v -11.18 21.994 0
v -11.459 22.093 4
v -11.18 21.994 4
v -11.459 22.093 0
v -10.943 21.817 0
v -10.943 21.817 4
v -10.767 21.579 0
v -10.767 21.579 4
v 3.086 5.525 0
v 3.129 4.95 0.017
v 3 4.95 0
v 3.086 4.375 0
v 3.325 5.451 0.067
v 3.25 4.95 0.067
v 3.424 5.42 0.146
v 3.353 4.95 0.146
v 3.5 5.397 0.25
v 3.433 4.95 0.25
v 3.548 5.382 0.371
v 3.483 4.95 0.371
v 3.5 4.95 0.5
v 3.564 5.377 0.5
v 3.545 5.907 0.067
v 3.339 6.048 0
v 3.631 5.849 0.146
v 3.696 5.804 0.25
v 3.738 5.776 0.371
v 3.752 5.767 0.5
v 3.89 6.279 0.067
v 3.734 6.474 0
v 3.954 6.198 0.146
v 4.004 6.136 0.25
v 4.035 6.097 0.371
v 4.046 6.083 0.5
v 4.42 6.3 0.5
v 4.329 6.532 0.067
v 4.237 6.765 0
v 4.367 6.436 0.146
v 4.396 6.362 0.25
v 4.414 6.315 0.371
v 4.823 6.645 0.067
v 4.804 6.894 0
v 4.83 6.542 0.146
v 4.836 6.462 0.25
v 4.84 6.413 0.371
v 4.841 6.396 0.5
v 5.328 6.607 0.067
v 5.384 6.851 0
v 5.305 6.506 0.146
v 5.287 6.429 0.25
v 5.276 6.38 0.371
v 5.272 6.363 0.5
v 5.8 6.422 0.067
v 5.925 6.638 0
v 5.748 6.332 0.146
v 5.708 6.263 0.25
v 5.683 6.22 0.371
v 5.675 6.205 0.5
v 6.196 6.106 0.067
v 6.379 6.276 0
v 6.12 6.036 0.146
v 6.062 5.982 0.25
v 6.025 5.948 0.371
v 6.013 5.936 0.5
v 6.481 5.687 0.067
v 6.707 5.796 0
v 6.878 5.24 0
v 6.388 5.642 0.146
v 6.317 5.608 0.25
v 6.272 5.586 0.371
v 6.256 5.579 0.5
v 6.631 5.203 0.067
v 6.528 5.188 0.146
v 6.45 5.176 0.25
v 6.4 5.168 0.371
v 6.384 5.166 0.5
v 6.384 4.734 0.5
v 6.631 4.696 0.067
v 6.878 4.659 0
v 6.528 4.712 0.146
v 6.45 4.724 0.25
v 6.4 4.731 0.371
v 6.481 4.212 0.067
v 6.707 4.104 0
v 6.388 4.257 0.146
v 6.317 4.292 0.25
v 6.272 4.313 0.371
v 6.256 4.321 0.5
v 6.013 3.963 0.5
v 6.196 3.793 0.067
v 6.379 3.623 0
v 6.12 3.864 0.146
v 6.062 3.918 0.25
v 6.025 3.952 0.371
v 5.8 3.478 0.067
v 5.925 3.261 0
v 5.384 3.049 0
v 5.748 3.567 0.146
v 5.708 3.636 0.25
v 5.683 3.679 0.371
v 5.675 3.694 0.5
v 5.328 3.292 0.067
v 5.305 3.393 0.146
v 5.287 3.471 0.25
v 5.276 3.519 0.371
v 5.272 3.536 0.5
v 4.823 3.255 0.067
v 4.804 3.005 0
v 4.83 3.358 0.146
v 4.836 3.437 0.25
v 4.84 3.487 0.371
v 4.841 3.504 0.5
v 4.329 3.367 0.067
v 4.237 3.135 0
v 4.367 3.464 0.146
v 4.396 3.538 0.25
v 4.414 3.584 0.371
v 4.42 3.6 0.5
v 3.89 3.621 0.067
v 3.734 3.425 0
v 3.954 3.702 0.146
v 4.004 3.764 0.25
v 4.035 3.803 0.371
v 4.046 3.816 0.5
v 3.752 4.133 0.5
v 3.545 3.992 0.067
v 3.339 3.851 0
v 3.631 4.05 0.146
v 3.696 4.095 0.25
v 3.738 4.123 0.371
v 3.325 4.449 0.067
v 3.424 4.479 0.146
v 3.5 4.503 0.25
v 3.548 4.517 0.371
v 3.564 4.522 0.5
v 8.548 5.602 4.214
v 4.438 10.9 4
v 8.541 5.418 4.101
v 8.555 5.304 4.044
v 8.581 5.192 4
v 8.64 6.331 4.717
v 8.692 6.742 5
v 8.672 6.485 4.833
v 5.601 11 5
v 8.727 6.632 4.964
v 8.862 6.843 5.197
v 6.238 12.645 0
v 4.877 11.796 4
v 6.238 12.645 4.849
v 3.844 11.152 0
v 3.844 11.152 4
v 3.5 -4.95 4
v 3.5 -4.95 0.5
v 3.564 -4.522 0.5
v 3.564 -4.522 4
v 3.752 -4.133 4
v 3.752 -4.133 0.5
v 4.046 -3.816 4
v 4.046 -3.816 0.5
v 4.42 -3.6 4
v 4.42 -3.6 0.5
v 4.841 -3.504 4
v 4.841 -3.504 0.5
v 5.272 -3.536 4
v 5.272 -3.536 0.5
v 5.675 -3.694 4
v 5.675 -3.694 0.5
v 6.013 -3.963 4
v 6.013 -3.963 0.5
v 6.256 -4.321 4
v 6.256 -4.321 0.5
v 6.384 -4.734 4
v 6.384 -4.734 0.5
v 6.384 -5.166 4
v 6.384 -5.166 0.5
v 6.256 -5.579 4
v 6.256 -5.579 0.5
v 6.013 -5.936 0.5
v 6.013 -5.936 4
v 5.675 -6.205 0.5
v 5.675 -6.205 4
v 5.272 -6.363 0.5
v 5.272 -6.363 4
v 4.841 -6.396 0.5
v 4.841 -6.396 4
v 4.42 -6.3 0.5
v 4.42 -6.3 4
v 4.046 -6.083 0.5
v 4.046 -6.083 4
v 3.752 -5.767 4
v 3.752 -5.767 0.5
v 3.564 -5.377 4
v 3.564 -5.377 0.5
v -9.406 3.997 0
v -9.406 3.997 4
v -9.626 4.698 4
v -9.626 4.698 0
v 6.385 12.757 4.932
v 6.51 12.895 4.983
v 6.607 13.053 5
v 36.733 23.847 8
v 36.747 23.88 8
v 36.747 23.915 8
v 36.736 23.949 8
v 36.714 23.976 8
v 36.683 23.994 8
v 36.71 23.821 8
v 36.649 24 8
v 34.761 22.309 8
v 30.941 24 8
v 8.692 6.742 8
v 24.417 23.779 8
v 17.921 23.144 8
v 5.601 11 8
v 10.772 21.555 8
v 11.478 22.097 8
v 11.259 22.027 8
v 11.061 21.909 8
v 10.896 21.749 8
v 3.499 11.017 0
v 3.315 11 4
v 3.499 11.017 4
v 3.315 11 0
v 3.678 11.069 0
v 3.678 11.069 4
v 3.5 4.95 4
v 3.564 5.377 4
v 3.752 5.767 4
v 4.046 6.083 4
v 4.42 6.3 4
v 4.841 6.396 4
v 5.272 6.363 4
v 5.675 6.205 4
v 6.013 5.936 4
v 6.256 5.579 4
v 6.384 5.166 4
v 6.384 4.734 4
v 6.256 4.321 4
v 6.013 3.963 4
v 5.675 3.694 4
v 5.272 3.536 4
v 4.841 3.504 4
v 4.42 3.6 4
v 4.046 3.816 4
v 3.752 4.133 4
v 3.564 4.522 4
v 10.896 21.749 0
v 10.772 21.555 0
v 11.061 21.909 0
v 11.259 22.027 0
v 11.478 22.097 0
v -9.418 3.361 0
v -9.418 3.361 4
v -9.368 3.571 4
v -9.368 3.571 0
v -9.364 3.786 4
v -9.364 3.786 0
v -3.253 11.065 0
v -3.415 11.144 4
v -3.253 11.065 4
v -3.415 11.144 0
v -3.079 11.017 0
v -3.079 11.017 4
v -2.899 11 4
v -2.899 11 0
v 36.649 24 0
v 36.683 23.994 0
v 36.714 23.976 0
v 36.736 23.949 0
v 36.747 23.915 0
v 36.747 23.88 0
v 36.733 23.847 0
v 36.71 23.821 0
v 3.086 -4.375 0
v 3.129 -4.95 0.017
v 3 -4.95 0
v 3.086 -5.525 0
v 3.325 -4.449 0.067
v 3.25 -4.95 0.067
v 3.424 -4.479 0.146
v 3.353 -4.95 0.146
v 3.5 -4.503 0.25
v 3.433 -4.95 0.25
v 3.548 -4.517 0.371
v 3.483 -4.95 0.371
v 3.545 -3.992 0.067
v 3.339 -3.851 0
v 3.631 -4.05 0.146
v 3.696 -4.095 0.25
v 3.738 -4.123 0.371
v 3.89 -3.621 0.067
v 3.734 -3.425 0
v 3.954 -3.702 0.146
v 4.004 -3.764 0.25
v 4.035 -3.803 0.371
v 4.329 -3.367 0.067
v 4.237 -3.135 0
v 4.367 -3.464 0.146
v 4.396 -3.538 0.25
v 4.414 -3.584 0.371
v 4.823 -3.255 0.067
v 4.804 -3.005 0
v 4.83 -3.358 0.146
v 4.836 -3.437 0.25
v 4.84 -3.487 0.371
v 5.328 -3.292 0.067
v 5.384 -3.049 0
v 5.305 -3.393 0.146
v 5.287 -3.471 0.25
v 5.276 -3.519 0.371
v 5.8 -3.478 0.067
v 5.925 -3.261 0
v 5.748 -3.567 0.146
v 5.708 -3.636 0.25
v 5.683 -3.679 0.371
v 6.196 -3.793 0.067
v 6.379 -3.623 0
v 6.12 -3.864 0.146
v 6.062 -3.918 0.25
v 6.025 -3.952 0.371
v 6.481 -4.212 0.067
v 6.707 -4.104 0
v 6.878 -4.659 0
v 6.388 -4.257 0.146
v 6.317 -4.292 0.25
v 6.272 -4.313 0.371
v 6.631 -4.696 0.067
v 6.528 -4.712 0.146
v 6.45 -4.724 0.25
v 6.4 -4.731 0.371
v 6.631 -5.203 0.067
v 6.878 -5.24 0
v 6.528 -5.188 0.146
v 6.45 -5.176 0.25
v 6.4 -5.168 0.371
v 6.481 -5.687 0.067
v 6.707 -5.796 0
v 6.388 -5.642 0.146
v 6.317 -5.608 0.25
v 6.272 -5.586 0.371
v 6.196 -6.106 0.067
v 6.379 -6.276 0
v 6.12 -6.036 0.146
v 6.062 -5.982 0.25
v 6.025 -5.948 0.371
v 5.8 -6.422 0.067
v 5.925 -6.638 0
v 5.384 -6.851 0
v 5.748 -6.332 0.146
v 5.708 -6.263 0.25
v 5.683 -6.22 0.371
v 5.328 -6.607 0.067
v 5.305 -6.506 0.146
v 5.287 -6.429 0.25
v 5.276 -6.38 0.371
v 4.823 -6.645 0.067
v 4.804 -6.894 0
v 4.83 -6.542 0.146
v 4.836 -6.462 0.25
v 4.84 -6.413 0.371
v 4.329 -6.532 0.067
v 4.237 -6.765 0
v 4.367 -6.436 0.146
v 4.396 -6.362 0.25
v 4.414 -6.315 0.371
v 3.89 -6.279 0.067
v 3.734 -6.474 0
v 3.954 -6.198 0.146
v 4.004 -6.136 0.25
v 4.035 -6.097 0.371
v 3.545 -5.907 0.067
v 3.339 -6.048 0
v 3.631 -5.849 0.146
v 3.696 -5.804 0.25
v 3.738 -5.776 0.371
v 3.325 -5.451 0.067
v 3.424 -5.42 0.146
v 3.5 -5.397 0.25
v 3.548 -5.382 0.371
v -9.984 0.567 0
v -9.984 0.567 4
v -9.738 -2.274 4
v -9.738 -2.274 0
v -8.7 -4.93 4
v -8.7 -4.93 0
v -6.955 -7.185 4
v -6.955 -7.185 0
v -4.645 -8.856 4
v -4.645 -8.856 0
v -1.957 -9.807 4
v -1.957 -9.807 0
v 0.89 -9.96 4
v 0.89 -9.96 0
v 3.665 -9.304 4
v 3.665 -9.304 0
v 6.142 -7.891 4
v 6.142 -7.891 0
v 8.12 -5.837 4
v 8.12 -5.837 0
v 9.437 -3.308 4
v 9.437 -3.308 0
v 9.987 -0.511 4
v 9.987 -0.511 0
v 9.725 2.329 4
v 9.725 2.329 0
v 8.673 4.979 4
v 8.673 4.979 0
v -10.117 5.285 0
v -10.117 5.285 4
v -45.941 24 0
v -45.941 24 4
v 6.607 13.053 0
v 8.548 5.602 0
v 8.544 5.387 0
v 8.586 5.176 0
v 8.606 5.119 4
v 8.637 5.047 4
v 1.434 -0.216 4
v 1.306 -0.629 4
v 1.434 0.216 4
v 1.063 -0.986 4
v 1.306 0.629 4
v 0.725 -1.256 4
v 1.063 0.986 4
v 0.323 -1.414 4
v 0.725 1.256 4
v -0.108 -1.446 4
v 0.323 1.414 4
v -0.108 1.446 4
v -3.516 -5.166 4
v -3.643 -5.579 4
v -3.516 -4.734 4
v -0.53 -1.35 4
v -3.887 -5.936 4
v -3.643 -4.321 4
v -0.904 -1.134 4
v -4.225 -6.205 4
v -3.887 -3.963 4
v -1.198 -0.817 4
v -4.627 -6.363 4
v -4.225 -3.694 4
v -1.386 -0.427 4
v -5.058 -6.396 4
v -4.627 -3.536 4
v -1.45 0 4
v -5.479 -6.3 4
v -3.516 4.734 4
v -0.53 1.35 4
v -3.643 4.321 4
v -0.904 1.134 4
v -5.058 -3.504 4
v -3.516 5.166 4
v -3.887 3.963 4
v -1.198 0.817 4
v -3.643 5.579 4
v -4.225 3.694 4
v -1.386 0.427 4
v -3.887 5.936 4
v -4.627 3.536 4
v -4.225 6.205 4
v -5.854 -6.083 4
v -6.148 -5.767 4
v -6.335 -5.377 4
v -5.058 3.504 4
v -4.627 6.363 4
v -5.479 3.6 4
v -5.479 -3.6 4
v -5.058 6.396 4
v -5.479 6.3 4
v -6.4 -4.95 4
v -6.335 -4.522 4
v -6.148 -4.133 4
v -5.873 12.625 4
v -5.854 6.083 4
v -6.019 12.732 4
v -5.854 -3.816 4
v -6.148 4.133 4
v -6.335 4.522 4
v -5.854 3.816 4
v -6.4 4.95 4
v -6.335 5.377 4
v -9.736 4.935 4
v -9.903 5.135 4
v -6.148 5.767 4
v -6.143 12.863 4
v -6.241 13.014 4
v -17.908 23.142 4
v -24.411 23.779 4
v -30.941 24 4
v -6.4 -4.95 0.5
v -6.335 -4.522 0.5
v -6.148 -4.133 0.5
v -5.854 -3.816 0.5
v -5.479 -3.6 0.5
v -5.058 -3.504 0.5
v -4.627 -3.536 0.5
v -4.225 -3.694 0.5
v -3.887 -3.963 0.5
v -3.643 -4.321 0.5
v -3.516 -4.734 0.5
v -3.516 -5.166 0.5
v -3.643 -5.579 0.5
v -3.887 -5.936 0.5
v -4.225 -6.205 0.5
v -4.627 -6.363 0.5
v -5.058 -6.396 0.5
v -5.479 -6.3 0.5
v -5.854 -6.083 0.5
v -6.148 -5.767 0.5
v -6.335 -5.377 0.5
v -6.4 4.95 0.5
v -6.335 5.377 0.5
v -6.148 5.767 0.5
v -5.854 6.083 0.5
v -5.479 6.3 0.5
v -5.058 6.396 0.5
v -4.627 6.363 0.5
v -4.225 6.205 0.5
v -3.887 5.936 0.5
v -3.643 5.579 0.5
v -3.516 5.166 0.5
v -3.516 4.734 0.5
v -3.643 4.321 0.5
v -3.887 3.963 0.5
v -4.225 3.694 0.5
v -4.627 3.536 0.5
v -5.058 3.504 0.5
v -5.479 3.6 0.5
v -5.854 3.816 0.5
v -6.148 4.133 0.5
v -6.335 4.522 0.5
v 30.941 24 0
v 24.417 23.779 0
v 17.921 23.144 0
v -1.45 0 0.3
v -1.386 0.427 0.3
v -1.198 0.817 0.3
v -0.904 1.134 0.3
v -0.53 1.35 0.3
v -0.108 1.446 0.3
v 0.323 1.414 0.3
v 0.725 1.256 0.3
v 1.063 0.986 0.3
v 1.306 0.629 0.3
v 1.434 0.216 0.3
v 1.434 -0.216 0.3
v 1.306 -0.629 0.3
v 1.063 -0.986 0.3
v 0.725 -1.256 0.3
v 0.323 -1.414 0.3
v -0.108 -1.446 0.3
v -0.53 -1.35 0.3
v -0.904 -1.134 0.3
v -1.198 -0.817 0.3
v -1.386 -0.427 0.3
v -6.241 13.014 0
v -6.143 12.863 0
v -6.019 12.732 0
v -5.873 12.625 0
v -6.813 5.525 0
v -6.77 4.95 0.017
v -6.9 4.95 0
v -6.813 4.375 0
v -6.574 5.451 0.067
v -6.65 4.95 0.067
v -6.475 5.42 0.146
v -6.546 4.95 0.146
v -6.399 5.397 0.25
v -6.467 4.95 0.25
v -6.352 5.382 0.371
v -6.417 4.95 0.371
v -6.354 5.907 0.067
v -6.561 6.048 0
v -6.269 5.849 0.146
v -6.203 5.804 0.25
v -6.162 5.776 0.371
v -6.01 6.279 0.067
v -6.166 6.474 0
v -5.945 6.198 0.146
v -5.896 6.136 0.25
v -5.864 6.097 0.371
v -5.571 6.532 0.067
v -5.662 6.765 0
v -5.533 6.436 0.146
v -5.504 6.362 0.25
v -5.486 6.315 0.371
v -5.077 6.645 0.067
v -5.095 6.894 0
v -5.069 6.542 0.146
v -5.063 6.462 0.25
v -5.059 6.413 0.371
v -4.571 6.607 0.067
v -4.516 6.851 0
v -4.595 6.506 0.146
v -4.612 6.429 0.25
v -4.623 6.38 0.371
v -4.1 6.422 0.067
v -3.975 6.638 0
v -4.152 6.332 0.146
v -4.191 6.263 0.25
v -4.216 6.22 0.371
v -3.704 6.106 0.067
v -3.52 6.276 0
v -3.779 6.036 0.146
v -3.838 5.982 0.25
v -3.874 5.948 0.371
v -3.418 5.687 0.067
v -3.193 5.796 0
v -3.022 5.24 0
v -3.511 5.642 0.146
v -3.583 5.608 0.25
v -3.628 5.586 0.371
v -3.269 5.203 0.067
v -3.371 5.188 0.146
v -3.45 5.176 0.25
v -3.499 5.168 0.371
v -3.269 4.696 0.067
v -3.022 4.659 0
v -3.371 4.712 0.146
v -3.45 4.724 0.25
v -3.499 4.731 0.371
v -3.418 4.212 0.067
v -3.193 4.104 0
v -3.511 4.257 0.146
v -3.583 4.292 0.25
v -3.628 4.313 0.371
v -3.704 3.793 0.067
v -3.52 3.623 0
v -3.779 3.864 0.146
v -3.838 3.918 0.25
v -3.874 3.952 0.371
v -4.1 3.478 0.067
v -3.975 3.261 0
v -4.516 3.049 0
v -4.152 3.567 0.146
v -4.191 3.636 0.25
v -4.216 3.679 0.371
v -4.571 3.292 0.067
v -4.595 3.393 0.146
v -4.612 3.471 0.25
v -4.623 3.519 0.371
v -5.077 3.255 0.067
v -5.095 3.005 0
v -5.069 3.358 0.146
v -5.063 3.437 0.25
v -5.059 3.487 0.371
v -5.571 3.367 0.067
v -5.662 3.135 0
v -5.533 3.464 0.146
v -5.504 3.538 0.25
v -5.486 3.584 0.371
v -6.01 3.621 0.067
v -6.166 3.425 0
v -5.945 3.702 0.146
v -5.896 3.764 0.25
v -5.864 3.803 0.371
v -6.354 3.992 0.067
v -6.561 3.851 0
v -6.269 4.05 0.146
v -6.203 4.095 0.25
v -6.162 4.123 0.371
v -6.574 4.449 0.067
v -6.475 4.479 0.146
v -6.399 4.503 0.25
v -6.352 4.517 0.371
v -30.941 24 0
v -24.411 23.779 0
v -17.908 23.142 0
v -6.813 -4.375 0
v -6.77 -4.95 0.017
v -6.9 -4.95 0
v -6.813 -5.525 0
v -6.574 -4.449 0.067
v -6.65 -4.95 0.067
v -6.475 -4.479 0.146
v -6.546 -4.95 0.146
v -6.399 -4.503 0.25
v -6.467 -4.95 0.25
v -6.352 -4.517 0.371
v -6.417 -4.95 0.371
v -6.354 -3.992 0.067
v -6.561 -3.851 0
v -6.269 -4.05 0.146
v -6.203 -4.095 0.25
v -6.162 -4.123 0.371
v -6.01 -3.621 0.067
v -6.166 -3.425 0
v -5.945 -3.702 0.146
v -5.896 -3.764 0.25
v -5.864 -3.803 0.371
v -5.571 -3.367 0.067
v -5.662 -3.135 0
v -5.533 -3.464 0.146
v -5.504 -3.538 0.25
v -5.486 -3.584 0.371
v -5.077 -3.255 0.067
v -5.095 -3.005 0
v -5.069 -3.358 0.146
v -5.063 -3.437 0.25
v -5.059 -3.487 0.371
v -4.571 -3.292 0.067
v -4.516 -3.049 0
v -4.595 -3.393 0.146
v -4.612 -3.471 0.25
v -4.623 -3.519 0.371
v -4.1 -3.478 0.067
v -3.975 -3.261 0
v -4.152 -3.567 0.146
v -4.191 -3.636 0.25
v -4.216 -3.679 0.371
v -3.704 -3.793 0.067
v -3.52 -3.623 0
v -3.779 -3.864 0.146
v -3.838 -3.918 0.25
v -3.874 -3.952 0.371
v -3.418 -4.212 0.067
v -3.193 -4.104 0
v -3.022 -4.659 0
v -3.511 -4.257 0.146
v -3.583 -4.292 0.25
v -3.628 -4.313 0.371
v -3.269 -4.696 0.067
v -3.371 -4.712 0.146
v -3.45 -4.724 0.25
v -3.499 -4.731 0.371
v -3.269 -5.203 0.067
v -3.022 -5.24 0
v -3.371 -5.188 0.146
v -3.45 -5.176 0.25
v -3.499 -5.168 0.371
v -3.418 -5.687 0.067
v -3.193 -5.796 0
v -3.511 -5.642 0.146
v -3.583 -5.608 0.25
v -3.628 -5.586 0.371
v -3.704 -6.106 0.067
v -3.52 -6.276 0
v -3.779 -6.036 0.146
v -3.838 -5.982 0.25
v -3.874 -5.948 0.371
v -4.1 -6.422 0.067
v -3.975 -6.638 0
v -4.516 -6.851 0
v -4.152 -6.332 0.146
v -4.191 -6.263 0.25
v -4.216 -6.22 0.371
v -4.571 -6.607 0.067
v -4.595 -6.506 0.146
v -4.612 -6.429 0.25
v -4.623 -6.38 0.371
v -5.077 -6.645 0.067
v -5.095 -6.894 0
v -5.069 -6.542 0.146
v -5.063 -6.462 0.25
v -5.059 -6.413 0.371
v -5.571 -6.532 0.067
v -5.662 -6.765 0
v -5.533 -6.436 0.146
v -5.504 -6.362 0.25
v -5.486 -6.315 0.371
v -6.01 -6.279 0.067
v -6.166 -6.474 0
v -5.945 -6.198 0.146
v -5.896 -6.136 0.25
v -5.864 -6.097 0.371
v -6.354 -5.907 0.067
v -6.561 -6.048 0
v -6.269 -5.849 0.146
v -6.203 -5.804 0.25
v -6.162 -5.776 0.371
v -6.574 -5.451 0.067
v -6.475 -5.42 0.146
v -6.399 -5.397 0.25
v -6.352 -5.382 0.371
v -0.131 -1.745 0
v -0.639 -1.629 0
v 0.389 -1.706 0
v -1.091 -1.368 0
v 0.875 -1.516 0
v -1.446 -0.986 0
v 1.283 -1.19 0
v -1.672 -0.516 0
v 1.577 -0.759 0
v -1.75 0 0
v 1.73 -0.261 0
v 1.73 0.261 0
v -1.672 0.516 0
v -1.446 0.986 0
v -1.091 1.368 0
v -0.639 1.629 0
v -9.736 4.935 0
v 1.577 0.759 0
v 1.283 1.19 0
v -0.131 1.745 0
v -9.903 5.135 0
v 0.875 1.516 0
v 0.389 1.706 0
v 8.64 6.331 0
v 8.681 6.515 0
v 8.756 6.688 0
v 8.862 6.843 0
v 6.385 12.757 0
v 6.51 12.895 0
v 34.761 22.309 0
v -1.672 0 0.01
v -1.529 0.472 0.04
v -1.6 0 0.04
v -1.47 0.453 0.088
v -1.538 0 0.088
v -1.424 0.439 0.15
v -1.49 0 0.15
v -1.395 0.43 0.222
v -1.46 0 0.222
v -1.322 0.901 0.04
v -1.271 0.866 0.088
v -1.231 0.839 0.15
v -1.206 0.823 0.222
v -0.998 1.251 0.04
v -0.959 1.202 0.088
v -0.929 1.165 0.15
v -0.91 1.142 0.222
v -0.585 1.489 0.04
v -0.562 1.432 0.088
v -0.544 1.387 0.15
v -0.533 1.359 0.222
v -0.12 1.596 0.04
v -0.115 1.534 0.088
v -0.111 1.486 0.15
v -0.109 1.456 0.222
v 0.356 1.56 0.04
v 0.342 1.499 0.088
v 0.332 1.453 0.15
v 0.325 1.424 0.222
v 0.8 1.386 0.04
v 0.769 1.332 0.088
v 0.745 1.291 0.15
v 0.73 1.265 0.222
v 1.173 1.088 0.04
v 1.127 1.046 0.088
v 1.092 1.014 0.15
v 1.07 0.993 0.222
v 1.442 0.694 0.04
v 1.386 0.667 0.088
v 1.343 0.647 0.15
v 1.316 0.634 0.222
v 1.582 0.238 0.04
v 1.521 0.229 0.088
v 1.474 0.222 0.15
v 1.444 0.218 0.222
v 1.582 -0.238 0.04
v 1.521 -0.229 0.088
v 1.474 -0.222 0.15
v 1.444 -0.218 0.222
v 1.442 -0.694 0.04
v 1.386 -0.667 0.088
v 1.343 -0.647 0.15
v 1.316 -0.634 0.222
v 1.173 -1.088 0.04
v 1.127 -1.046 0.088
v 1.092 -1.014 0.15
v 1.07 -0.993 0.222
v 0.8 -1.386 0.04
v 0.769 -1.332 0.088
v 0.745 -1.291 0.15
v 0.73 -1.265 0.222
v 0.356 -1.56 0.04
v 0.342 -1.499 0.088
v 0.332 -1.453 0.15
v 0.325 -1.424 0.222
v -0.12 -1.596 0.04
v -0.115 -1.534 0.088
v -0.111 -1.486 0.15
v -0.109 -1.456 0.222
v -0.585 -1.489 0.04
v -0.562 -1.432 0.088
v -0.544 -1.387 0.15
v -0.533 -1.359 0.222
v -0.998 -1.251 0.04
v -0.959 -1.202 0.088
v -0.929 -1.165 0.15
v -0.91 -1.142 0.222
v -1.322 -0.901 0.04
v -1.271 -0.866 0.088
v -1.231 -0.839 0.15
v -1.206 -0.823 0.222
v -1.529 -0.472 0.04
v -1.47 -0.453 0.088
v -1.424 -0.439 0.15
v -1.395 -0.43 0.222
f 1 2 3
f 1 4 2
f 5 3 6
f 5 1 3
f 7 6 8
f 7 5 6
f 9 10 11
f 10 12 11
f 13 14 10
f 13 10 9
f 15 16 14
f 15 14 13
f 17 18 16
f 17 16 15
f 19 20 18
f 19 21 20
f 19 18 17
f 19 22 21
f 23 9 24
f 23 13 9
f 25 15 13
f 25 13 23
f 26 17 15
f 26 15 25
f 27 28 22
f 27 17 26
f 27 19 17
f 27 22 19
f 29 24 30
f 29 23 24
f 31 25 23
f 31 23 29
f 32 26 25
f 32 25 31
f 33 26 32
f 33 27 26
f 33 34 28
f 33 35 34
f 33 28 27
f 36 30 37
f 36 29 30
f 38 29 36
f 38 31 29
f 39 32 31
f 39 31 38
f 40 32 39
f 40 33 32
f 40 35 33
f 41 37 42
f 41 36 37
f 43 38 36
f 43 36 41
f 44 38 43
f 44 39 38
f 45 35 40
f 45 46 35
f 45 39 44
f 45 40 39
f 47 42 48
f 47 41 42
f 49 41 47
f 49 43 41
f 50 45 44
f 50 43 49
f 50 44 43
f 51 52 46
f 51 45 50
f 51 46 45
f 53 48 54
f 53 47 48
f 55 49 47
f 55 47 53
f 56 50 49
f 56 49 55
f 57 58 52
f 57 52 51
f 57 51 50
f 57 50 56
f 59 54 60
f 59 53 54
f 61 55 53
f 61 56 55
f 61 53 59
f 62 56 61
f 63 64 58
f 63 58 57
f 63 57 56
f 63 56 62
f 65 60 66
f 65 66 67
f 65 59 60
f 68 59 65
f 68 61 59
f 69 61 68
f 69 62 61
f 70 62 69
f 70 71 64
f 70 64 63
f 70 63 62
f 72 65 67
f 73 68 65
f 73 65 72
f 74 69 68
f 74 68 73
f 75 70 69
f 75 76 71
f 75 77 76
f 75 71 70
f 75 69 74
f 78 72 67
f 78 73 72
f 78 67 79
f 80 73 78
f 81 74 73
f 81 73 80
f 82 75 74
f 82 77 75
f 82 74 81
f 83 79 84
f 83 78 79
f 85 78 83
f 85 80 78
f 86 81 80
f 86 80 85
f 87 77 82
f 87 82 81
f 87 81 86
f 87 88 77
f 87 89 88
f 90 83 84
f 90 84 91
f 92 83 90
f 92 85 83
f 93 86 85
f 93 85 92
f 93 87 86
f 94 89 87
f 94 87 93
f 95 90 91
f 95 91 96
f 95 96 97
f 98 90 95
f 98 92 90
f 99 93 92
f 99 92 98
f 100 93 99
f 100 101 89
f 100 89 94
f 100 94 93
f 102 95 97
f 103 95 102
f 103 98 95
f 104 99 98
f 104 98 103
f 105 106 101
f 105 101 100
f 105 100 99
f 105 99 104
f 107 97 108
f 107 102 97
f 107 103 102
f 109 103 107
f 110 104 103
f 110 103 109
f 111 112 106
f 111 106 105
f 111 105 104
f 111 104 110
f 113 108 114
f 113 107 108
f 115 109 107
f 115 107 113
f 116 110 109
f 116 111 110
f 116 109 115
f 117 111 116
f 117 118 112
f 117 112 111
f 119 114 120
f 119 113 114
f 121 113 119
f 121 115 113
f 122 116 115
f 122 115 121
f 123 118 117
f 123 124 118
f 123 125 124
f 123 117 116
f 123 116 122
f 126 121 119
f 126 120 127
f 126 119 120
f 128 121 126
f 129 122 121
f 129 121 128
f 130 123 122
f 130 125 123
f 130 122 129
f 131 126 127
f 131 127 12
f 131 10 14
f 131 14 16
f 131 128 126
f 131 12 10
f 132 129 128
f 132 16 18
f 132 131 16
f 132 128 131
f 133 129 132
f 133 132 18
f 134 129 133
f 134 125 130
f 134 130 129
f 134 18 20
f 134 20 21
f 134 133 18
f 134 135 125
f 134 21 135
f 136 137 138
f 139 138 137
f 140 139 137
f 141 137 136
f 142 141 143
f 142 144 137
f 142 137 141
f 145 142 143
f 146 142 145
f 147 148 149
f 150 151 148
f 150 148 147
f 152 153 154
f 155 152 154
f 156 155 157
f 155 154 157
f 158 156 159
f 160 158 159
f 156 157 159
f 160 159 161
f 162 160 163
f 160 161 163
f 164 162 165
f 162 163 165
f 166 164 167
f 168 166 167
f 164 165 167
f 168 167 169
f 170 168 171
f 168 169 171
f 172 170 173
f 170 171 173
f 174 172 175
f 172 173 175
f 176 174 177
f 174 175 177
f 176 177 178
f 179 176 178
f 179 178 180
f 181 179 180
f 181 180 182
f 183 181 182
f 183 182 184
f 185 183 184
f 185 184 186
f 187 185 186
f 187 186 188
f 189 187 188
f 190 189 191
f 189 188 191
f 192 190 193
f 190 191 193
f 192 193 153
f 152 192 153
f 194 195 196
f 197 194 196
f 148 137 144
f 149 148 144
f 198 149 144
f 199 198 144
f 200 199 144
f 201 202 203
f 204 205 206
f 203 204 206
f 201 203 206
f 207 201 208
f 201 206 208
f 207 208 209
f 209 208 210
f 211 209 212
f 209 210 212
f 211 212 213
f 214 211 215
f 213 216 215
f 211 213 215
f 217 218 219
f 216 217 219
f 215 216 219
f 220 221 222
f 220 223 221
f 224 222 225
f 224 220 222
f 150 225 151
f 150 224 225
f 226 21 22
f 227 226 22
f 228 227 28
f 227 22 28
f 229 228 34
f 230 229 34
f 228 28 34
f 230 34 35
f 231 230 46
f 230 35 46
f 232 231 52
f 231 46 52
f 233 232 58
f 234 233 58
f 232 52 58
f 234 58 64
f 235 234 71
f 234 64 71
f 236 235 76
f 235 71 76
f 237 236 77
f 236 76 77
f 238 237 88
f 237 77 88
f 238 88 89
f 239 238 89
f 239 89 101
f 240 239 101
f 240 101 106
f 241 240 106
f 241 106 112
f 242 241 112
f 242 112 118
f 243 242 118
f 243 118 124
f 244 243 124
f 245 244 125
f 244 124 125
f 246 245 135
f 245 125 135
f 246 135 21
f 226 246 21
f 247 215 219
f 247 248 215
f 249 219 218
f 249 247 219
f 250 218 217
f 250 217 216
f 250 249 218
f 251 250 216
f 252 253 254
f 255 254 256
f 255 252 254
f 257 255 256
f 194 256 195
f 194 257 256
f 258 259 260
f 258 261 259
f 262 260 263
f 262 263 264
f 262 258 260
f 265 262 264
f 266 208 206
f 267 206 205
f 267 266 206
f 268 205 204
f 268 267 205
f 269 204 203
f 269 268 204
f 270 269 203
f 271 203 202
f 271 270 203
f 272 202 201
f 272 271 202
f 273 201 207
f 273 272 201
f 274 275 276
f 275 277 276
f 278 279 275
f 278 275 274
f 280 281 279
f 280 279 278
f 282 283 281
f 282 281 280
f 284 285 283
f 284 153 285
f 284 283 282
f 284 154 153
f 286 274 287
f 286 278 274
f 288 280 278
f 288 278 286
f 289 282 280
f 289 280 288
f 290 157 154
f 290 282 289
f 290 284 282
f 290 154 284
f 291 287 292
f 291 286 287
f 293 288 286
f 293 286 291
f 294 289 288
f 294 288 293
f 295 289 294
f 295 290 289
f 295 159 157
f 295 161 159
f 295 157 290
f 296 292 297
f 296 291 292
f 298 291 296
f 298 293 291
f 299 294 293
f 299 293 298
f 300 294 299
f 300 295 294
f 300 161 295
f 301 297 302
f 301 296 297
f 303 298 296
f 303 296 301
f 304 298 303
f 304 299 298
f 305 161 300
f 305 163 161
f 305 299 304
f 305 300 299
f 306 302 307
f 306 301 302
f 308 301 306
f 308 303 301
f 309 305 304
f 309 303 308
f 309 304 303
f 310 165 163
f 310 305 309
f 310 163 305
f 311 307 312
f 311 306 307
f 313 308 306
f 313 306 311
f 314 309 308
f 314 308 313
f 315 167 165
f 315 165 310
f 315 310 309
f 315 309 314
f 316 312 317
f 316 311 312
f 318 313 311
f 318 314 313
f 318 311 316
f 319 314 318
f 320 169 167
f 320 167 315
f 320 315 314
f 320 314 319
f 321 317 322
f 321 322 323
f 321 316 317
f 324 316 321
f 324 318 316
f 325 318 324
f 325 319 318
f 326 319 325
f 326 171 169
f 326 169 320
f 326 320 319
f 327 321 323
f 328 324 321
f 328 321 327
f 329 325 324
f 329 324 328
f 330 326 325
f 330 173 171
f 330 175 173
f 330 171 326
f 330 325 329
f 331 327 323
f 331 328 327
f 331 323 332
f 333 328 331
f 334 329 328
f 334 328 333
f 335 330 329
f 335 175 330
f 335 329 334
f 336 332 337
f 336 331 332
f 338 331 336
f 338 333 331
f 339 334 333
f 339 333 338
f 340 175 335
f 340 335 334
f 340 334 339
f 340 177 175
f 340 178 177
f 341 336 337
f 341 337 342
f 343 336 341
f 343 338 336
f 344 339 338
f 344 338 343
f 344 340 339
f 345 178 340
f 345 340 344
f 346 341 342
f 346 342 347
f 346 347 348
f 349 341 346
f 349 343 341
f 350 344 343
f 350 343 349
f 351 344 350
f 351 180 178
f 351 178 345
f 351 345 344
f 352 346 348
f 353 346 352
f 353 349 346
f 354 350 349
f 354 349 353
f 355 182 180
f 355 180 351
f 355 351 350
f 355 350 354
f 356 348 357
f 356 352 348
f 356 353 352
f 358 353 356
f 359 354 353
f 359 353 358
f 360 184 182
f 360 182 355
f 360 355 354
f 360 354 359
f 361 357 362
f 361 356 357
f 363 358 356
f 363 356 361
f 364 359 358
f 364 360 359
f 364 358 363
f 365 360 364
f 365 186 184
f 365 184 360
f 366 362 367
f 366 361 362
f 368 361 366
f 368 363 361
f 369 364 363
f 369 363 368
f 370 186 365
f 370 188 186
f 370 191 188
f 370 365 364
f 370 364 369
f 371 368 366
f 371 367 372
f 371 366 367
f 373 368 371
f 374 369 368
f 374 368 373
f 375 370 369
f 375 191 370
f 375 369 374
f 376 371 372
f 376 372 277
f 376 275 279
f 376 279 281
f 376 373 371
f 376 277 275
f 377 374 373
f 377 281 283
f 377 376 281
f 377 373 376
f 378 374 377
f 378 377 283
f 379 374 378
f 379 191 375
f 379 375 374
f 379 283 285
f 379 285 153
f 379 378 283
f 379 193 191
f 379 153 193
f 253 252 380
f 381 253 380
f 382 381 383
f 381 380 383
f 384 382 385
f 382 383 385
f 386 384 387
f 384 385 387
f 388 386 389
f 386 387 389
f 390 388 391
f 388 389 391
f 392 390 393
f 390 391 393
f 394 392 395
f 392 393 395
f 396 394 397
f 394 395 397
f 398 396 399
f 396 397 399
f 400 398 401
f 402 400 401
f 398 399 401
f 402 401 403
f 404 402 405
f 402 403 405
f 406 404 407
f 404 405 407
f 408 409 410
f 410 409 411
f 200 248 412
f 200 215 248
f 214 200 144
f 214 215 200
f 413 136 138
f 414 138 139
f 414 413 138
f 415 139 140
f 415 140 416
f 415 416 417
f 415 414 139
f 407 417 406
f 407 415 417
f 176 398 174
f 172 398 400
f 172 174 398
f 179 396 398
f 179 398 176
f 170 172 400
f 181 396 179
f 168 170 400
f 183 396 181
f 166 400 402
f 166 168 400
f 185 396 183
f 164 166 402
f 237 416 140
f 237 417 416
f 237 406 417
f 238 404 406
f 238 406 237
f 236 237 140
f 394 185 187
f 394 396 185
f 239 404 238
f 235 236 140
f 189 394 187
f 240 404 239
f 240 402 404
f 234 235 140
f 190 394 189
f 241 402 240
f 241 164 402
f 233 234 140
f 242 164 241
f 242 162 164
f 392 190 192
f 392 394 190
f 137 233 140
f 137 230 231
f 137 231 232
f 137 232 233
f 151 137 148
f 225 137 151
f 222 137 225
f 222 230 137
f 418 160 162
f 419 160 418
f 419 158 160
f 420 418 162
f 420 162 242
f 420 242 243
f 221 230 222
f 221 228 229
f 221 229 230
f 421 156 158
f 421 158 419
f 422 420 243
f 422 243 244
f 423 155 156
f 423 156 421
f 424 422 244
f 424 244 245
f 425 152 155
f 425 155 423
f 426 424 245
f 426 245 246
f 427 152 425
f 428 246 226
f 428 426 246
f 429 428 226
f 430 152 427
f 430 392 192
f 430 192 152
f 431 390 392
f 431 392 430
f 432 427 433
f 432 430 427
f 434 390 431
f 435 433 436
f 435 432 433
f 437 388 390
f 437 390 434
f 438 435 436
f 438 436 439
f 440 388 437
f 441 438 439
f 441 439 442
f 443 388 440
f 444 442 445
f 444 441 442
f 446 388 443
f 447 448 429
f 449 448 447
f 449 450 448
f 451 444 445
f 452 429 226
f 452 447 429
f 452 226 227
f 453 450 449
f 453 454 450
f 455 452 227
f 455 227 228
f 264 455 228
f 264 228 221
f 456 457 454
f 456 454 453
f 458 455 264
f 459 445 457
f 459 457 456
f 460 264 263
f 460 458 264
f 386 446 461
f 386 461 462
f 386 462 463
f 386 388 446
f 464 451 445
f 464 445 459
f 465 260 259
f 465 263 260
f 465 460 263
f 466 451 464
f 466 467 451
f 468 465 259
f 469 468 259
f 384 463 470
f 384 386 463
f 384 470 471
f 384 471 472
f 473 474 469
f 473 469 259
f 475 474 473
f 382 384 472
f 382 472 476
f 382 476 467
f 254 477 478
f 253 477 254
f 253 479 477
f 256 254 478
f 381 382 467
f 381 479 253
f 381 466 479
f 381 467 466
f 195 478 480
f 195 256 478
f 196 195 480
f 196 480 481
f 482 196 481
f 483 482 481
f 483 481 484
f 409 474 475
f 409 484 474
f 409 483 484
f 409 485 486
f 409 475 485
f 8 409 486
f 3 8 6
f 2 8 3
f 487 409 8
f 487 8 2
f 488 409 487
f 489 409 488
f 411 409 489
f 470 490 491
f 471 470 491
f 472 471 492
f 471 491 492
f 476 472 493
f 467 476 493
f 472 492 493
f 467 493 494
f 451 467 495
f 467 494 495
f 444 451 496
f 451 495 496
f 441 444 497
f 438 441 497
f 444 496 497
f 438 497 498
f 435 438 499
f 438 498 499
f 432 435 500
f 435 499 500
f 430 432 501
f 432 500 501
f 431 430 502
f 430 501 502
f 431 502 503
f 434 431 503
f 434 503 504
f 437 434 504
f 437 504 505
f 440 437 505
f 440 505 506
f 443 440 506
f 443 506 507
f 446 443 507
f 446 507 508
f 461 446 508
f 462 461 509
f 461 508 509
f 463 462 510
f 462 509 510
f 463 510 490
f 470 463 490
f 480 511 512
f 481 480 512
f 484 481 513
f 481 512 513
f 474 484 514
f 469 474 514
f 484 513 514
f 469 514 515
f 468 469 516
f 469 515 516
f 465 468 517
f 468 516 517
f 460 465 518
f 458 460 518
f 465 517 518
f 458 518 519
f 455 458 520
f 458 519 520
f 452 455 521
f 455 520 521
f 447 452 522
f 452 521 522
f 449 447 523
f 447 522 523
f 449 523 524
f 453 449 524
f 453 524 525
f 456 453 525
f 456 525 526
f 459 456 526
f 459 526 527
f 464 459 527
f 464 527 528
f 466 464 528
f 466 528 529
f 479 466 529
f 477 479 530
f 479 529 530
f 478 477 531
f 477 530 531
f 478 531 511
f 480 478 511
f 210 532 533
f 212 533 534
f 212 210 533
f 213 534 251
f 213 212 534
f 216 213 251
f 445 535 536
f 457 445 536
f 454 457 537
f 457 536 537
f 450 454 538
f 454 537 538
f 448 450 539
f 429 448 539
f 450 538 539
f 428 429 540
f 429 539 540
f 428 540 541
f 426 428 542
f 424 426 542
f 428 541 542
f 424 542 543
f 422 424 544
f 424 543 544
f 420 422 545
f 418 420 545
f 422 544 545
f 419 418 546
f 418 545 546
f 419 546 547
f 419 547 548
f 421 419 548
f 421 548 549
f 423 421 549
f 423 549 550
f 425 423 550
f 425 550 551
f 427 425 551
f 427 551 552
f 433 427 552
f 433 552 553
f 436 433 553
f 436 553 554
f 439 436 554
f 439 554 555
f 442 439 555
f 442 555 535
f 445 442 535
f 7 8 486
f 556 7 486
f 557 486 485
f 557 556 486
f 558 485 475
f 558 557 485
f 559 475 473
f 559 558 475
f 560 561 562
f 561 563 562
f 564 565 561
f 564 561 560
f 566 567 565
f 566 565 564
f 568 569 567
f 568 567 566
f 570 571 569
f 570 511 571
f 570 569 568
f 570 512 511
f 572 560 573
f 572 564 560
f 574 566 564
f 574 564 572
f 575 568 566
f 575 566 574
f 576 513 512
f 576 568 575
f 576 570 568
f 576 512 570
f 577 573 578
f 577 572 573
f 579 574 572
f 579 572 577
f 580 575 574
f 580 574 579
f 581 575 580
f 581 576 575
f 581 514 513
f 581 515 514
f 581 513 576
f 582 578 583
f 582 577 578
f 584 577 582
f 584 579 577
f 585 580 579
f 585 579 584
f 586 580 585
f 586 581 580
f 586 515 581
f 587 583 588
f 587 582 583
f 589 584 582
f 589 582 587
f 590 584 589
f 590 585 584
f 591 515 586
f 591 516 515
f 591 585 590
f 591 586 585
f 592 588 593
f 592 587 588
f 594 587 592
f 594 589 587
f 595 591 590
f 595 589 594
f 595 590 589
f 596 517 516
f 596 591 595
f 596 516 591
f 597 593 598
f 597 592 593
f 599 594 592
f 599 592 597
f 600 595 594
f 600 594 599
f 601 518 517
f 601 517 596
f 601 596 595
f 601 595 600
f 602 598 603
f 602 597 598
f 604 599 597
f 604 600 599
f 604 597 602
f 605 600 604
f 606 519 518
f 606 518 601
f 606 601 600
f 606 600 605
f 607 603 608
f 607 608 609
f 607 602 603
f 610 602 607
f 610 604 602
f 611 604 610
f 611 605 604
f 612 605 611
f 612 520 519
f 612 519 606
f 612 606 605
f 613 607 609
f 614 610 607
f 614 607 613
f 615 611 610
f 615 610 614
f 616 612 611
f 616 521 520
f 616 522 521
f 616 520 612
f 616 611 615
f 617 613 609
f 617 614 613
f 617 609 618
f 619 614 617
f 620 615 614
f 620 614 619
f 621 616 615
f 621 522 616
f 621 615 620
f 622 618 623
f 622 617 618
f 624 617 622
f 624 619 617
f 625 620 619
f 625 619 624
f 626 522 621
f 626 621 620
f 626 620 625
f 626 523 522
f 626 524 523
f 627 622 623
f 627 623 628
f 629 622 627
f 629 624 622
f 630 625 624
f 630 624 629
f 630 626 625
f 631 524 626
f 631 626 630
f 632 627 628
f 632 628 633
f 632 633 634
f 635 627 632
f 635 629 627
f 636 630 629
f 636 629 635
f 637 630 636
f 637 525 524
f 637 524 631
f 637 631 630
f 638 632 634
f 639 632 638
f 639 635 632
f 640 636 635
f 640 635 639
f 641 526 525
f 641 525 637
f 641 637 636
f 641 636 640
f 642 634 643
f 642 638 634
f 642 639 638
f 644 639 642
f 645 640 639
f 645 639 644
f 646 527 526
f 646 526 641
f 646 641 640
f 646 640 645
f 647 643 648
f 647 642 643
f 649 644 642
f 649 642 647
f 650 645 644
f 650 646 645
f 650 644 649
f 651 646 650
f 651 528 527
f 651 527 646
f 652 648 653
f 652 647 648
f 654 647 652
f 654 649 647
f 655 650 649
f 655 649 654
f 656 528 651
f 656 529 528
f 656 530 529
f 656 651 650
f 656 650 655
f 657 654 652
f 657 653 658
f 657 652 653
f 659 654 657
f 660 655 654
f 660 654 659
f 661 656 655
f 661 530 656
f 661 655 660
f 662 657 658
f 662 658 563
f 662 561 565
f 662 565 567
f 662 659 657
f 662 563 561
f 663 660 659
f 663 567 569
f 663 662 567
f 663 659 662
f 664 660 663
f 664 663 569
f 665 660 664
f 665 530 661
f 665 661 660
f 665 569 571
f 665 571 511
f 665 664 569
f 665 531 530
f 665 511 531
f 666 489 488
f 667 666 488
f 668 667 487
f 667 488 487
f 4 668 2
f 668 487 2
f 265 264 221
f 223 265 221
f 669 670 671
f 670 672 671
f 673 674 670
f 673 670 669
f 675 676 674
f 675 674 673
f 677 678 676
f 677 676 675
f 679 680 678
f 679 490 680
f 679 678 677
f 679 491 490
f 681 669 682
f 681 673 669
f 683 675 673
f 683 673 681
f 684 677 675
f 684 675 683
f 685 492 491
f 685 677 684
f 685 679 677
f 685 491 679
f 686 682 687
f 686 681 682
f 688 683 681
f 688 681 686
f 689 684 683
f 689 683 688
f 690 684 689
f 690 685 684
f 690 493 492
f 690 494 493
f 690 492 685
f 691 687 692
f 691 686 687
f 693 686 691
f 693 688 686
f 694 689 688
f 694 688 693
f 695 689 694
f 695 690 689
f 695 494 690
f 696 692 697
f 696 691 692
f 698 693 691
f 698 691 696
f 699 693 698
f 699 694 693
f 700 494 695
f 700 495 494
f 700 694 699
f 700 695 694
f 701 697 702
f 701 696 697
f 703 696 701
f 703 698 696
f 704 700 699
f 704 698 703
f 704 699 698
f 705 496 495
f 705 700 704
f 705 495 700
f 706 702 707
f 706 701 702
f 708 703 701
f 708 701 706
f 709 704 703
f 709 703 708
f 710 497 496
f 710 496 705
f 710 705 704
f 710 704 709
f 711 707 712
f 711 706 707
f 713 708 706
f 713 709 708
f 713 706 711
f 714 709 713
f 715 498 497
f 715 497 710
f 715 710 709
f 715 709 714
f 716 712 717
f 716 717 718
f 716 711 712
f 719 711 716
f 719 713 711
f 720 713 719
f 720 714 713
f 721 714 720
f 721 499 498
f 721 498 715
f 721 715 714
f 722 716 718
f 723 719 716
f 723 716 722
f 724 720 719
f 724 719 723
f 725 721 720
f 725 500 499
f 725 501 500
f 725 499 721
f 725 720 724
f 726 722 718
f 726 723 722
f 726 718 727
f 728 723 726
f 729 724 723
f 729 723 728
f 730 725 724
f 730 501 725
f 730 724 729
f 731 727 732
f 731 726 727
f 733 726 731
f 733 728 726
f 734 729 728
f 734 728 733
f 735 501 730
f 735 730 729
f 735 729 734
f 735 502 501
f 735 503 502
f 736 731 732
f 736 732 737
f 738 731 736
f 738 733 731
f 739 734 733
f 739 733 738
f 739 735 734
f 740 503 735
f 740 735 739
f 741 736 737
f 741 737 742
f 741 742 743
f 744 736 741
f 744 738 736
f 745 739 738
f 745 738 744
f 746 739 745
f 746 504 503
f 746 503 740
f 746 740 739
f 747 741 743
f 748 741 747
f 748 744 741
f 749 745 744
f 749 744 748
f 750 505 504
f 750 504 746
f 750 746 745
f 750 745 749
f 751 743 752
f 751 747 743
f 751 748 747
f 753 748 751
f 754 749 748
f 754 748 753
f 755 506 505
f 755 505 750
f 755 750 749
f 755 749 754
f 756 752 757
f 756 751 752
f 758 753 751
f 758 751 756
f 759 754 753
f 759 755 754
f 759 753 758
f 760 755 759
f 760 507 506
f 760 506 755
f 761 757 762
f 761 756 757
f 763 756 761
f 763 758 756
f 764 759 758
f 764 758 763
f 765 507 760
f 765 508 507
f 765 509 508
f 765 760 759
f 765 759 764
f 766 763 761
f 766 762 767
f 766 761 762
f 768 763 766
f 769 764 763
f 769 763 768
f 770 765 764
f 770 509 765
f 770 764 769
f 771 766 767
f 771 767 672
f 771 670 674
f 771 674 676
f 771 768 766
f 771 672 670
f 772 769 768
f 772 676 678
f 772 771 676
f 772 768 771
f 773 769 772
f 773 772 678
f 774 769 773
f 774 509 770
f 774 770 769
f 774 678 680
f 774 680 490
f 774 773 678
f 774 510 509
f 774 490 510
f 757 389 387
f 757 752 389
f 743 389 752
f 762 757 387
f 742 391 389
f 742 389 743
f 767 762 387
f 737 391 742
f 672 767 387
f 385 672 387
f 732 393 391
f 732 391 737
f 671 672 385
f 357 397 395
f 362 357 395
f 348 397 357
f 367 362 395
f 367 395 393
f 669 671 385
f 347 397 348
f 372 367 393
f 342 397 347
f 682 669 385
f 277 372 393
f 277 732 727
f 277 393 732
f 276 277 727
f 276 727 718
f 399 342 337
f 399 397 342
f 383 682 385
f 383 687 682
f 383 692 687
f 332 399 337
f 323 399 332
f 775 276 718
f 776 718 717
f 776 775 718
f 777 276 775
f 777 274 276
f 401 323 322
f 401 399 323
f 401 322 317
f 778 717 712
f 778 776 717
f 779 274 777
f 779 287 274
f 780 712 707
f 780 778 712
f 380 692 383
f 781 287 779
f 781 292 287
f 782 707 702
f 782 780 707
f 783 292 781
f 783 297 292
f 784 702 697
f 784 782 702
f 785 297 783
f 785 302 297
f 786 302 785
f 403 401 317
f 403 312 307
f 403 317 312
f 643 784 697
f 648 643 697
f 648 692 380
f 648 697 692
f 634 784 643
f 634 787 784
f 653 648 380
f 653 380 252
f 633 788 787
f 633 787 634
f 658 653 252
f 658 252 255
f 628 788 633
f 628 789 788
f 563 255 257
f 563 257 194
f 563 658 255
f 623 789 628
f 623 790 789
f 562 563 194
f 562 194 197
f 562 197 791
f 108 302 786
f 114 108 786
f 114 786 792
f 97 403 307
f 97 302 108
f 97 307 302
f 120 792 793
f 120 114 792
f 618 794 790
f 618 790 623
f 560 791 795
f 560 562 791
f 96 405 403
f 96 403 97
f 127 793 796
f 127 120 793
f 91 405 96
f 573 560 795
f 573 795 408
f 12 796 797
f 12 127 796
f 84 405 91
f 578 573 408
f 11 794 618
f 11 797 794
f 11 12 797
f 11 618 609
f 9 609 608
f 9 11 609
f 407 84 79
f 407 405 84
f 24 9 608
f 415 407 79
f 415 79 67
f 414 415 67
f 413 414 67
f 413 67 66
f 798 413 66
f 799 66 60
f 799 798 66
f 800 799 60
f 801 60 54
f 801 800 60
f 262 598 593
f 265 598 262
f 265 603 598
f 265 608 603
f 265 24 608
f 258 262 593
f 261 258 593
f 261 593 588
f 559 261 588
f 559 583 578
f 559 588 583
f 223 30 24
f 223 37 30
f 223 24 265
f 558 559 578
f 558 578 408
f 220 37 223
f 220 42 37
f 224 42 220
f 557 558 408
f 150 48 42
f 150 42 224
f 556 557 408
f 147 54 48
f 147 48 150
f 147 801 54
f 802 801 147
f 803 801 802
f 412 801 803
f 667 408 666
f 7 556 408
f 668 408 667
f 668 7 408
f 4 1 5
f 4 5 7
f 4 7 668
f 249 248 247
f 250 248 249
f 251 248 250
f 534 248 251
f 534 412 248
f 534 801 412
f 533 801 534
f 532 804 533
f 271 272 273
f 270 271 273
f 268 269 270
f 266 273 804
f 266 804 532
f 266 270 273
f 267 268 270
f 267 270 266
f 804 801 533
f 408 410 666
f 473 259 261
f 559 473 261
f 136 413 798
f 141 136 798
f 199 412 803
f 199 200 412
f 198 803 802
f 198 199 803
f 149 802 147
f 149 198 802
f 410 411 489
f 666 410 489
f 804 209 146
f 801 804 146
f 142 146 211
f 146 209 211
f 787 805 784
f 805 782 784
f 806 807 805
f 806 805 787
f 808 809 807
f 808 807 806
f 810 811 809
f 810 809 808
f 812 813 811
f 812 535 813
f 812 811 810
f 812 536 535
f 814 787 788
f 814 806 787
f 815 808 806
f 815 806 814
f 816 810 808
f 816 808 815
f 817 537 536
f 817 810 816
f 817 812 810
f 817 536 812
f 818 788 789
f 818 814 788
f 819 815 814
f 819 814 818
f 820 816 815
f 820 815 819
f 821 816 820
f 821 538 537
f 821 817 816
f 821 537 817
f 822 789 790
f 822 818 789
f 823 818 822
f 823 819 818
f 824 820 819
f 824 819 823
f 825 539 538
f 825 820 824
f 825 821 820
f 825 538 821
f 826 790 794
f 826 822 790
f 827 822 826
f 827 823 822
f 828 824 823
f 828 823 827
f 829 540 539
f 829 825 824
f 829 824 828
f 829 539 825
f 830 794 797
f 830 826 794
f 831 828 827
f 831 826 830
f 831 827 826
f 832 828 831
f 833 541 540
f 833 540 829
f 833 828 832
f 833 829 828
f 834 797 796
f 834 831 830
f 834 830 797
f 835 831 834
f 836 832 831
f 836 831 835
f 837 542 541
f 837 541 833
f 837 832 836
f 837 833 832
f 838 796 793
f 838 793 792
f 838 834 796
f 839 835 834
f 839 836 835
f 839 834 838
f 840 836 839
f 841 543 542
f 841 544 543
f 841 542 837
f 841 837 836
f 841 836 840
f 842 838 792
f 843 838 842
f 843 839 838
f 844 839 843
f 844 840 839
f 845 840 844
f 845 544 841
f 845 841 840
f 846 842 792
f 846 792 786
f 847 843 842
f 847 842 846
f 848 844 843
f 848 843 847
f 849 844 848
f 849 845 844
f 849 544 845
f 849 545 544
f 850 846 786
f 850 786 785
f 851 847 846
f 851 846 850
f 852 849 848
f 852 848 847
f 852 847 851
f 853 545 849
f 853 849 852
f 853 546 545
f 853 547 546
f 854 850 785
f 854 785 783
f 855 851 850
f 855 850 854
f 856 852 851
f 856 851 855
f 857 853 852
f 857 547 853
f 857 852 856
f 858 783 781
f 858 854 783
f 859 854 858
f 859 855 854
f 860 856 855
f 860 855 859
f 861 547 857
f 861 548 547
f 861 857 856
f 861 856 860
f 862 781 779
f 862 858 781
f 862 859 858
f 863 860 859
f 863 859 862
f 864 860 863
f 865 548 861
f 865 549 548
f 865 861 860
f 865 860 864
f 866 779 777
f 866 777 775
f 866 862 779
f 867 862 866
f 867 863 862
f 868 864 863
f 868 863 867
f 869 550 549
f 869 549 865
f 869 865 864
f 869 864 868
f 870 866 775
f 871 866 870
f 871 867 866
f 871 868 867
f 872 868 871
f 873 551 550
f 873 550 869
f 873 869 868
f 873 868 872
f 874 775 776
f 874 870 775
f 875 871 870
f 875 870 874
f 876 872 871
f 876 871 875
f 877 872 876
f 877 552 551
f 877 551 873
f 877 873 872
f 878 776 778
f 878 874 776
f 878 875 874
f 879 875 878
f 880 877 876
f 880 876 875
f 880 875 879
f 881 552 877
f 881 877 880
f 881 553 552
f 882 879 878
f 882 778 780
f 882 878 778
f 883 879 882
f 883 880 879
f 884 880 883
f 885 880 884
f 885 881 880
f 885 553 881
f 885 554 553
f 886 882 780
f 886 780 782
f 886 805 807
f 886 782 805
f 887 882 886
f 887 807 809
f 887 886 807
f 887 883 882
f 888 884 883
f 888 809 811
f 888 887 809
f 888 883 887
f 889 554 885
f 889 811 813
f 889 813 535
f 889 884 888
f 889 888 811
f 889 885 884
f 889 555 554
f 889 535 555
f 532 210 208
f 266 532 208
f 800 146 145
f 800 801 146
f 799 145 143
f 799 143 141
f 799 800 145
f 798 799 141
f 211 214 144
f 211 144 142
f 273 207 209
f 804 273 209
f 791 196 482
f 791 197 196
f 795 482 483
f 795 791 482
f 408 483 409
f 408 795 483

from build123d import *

# Parameters (mm, degrees)
SKETCH_1_R          = 10
EXTRUDE_1_DEPTH     = 4
EXTRUDE_3_DEPTH     = 4
SKETCH_4_R          = 1.45
CUT_EXTRUDE_1_DEPTH = 4
FILLET_5_R          = 0.5
CHAMFER_4_SIZE      = 1
EXTRUDE_START       = 4
EXTRUDE_4_DEPTH     = 4
CHAMFER_5_SIZE      = 2
CHAMFER_6_SIZE      = 1
FILLET_7_R          = 1
FILLET_8_R          = 1
FILLET_9_R          = 1
SKETCH_6_R          = 1.45
CUT_EXTRUDE_2_DEPTH = 10
FILLET_10_R         = 0.3
EXTRUDE_5_REACH     = 54.446
FILLET_11_R         = 0.1


with BuildPart() as part:
    # 草图1 → 凸台-拉伸1 (new body)
    with BuildSketch(Plane.XY):
        Circle(SKETCH_1_R)
    extrude(amount=EXTRUDE_1_DEPTH)

    # 草图3 → 凸台-拉伸3 (add)
    with BuildSketch(Plane.XY.offset(4)):
        with BuildLine():
            Line((-5.176881784364506, 11.000218871775912), (5.600807006130042, 11.000218871775912))
            Line((5.600807006130042, 11.000218871775912), (10.989651401377268, 22.000218871775843))
            ThreePointArc((10.989651401377268, 22.000218871775843), (20.91618080670068, 23.488479392998585), (30.94061356284172, 23.999999999999996))
            Line((30.94061356284172, 23.999999999999996), (0, 0))
            Line((0, 0), (-45.940613562841676, 24.00000000000002))
            Line((-45.940613562841676, 24.00000000000002), (-30.940613562841733, 23.999999999999996))
            ThreePointArc((-30.940613562841733, 23.999999999999996), (-20.916180806700666, 23.488479392998585), (-10.989651401377253, 22.000218871775836))
            Line((-10.989651401377253, 22.000218871775836), (-5.176881784364506, 11.000218871775912))
        make_face()
    extrude(amount=-EXTRUDE_3_DEPTH)

    # 草图4 → 切除-拉伸1 (cut)
    with BuildSketch(Plane(origin=(0, 0, 0), x_dir=(-1, 0, 0), z_dir=(0, 0, -1))):
        with Locations((-4.949747468305833, -4.949747468305833)):
            Circle(SKETCH_4_R)
        with Locations((-4.949747468305833, 4.949747468305833)):
            Circle(SKETCH_4_R)
        with Locations((4.949747468305833, 4.949747468305833)):
            Circle(SKETCH_4_R)
        with Locations((4.949747468305833, -4.949747468305833)):
            Circle(SKETCH_4_R)
    extrude(amount=-CUT_EXTRUDE_1_DEPTH, mode=Mode.SUBTRACT)

    # 圆角5
    fillet_5_edges = [part.edges().sort_by_distance(p)[0] for p in [
        (-3.4997474683058325, -4.949747468305833, 0),
        (-3.4997474683058325, 4.949747468305833, 0),
        (6.399747468305833, 4.949747468305833, 0),
        (6.399747468305833, -4.949747468305833, 0),
    ]]
    fillet(fillet_5_edges, radius=FILLET_5_R)

    # 倒角4
    # the kernel refuses this chamfer: 1 mm, written as the material it adds along each edge
    with BuildSketch(Plane(origin=(-8.863395681809687, 4.630358192157212, 4), x_dir=(-0.4155282844183179, -0.9095802575080274, 0), z_dir=(0, 0, -1))) as chamfer_4_piece_1:
        with BuildLine():
            Line((1.0573815899873193, -3e-17), (-CHAMFER_4_SIZE * 0.0528690794994, CHAMFER_4_SIZE * 0.998601452249))
            Line((-CHAMFER_4_SIZE * 0.0528690794994, CHAMFER_4_SIZE * 0.998601452249), (0, 0))
            ThreePointArc((0, 0), (0.5436016135552321, 0.01397436088292918), (1.0573815899873193, -3e-17))
        make_face()
    extrude(amount=4)
    with BuildSketch(Plane(origin=(7.901550123756916, 6.129070536529751, 4), x_dir=(0.5702751057051193, -0.8214537746051297, 0), z_dir=(0, 0, -1))) as chamfer_4_piece_2:
        with BuildLine():
            Line((1.0573815899873211, -5e-17), (-CHAMFER_4_SIZE * 0.0528690794994, -CHAMFER_4_SIZE * 0.998601452249))
            Line((-CHAMFER_4_SIZE * 0.0528690794994, -CHAMFER_4_SIZE * 0.998601452249), (0, 0))
            ThreePointArc((0, 0), (0.5436016135552315, -0.01397436088292837), (1.0573815899873211, -5e-17))
        make_face()
    extrude(amount=4)

    # 草图5 → 凸台-拉伸4 (add)
    with BuildSketch(Plane.XY.offset(4).offset(EXTRUDE_START)):
        with BuildLine():
            Line((10.989651401377264, 22.00021887177582), (5.600807006130042, 11.000218871775912))
            Line((5.600807006130042, 11.000218871775912), (8.691705136132603, 6.741977590182721))
            Line((8.691705136132603, 6.741977590182721), (30.94061356284172, 23.999999999999996))
            ThreePointArc((30.94061356284172, 23.999999999999996), (20.91618080670068, 23.488479392998585), (10.989651401377264, 22.00021887177582))
        make_face()
    extrude(amount=-EXTRUDE_4_DEPTH)

    # 倒角5
    chamfer_5_edges = [part.edges().sort_by_distance(p)[0] for p in [
        (-5.176881784364506, 11.000218871775912, 2),
        (5.600807006130042, 11.000218871775912, 2),
    ]]
    chamfer(chamfer_5_edges, length=CHAMFER_5_SIZE)

    # 倒角6
    chamfer_6_edges = [part.edges().sort_by_distance(p)[0] for p in [
        (7.146256071131322, 8.871098230979317, 4),
        (6.040746175985957, 11.898246447536525, 4),
    ]]
    chamfer(chamfer_6_edges, length=CHAMFER_6_SIZE)

    # 圆角7
    fillet_7_edges = [part.edges().sort_by_distance(p)[0] for p in [
        (6.480685345841874, 12.796274023297144, 2.5),
        (-3.1768817843645056, 11.00021887177591, 2),
        (3.60080700613004, 11.000218871775912, 2),
        (-6.111305934127264, 12.768509432837678, 2),
    ]]
    fillet(fillet_7_edges, radius=FILLET_7_R)

    # 圆角8
    fillet_8_edges = [part.edges().sort_by_distance(p)[0] for p in [
        (-10.989651401377252, 22.000218871775846, 2),
        (10.989651401377264, 22.000218871775836, 4),
    ]]
    fillet(fillet_8_edges, radius=FILLET_8_R)

    # 圆角9
    fillet_9_edges = [part.edges().sort_by_distance(p)[0] for p in [
        (8.504548521757462, 5.26048043823719, 2),
        (8.691705136132835, 6.741977590182982, 2.5),
        (-9.302767639872544, 3.6685847732522547, 2),
        (-9.749735249991502, 5.093394011372698, 2),
    ]]
    fillet(fillet_9_edges, radius=FILLET_9_R)

    # 草图6 → 切除-拉伸2 (cut)
    with BuildSketch(Plane(origin=(0, 0, 0), x_dir=(-1, 0, 0), z_dir=(0, 0, -1))):
        Circle(SKETCH_6_R)
    extrude(amount=-CUT_EXTRUDE_2_DEPTH, mode=Mode.SUBTRACT)

    # 圆角10
    fillet_10_edges = [part.edges().sort_by_distance(p)[0] for p in [
        (1.45, 1.8e-16, 0),
    ]]
    fillet(fillet_10_edges, radius=FILLET_10_R)

    # 凸台-拉伸5: up to this face of the body (flat: up to its plane)
    extrude_5_end = Plane(part.part.faces().sort_by_distance((-5.497293507, 11.434254101, 0))[0])
    # 草图7 → 凸台-拉伸5 (add, up to the picked face)
    with BuildSketch(Plane.XY.offset(8), mode=Mode.PRIVATE) as extrude_5_sk1:
        Polygon((30.94061356284172, 23.999999999999996), (36.94061356284172, 23.999999999999993), (34.761147405505504, 22.309432756728267), (8.691705136132603, 6.741977590182721), (28.761147405505504, 22.30943275672827), align=None)
    extrude_5_tool1 = split(extrude(extrude_5_sk1.sketch, amount=-EXTRUDE_5_REACH, mode=Mode.PRIVATE), bisect_by=extrude_5_end, keep=Keep.BOTH, mode=Mode.PRIVATE)
    add(extrude_5_tool1.solids().sort_by(Axis((25.637932, 18.197049, 8), (0, 0, -1)))[0])

    # 圆角11
    fillet_11_edges = [part.edges().sort_by_distance(p)[0] for p in [
        (36.94061356284172, 23.999999999999993, 4),
    ]]
    fillet(fillet_11_edges, radius=FILLET_11_R)


solid = part.part
